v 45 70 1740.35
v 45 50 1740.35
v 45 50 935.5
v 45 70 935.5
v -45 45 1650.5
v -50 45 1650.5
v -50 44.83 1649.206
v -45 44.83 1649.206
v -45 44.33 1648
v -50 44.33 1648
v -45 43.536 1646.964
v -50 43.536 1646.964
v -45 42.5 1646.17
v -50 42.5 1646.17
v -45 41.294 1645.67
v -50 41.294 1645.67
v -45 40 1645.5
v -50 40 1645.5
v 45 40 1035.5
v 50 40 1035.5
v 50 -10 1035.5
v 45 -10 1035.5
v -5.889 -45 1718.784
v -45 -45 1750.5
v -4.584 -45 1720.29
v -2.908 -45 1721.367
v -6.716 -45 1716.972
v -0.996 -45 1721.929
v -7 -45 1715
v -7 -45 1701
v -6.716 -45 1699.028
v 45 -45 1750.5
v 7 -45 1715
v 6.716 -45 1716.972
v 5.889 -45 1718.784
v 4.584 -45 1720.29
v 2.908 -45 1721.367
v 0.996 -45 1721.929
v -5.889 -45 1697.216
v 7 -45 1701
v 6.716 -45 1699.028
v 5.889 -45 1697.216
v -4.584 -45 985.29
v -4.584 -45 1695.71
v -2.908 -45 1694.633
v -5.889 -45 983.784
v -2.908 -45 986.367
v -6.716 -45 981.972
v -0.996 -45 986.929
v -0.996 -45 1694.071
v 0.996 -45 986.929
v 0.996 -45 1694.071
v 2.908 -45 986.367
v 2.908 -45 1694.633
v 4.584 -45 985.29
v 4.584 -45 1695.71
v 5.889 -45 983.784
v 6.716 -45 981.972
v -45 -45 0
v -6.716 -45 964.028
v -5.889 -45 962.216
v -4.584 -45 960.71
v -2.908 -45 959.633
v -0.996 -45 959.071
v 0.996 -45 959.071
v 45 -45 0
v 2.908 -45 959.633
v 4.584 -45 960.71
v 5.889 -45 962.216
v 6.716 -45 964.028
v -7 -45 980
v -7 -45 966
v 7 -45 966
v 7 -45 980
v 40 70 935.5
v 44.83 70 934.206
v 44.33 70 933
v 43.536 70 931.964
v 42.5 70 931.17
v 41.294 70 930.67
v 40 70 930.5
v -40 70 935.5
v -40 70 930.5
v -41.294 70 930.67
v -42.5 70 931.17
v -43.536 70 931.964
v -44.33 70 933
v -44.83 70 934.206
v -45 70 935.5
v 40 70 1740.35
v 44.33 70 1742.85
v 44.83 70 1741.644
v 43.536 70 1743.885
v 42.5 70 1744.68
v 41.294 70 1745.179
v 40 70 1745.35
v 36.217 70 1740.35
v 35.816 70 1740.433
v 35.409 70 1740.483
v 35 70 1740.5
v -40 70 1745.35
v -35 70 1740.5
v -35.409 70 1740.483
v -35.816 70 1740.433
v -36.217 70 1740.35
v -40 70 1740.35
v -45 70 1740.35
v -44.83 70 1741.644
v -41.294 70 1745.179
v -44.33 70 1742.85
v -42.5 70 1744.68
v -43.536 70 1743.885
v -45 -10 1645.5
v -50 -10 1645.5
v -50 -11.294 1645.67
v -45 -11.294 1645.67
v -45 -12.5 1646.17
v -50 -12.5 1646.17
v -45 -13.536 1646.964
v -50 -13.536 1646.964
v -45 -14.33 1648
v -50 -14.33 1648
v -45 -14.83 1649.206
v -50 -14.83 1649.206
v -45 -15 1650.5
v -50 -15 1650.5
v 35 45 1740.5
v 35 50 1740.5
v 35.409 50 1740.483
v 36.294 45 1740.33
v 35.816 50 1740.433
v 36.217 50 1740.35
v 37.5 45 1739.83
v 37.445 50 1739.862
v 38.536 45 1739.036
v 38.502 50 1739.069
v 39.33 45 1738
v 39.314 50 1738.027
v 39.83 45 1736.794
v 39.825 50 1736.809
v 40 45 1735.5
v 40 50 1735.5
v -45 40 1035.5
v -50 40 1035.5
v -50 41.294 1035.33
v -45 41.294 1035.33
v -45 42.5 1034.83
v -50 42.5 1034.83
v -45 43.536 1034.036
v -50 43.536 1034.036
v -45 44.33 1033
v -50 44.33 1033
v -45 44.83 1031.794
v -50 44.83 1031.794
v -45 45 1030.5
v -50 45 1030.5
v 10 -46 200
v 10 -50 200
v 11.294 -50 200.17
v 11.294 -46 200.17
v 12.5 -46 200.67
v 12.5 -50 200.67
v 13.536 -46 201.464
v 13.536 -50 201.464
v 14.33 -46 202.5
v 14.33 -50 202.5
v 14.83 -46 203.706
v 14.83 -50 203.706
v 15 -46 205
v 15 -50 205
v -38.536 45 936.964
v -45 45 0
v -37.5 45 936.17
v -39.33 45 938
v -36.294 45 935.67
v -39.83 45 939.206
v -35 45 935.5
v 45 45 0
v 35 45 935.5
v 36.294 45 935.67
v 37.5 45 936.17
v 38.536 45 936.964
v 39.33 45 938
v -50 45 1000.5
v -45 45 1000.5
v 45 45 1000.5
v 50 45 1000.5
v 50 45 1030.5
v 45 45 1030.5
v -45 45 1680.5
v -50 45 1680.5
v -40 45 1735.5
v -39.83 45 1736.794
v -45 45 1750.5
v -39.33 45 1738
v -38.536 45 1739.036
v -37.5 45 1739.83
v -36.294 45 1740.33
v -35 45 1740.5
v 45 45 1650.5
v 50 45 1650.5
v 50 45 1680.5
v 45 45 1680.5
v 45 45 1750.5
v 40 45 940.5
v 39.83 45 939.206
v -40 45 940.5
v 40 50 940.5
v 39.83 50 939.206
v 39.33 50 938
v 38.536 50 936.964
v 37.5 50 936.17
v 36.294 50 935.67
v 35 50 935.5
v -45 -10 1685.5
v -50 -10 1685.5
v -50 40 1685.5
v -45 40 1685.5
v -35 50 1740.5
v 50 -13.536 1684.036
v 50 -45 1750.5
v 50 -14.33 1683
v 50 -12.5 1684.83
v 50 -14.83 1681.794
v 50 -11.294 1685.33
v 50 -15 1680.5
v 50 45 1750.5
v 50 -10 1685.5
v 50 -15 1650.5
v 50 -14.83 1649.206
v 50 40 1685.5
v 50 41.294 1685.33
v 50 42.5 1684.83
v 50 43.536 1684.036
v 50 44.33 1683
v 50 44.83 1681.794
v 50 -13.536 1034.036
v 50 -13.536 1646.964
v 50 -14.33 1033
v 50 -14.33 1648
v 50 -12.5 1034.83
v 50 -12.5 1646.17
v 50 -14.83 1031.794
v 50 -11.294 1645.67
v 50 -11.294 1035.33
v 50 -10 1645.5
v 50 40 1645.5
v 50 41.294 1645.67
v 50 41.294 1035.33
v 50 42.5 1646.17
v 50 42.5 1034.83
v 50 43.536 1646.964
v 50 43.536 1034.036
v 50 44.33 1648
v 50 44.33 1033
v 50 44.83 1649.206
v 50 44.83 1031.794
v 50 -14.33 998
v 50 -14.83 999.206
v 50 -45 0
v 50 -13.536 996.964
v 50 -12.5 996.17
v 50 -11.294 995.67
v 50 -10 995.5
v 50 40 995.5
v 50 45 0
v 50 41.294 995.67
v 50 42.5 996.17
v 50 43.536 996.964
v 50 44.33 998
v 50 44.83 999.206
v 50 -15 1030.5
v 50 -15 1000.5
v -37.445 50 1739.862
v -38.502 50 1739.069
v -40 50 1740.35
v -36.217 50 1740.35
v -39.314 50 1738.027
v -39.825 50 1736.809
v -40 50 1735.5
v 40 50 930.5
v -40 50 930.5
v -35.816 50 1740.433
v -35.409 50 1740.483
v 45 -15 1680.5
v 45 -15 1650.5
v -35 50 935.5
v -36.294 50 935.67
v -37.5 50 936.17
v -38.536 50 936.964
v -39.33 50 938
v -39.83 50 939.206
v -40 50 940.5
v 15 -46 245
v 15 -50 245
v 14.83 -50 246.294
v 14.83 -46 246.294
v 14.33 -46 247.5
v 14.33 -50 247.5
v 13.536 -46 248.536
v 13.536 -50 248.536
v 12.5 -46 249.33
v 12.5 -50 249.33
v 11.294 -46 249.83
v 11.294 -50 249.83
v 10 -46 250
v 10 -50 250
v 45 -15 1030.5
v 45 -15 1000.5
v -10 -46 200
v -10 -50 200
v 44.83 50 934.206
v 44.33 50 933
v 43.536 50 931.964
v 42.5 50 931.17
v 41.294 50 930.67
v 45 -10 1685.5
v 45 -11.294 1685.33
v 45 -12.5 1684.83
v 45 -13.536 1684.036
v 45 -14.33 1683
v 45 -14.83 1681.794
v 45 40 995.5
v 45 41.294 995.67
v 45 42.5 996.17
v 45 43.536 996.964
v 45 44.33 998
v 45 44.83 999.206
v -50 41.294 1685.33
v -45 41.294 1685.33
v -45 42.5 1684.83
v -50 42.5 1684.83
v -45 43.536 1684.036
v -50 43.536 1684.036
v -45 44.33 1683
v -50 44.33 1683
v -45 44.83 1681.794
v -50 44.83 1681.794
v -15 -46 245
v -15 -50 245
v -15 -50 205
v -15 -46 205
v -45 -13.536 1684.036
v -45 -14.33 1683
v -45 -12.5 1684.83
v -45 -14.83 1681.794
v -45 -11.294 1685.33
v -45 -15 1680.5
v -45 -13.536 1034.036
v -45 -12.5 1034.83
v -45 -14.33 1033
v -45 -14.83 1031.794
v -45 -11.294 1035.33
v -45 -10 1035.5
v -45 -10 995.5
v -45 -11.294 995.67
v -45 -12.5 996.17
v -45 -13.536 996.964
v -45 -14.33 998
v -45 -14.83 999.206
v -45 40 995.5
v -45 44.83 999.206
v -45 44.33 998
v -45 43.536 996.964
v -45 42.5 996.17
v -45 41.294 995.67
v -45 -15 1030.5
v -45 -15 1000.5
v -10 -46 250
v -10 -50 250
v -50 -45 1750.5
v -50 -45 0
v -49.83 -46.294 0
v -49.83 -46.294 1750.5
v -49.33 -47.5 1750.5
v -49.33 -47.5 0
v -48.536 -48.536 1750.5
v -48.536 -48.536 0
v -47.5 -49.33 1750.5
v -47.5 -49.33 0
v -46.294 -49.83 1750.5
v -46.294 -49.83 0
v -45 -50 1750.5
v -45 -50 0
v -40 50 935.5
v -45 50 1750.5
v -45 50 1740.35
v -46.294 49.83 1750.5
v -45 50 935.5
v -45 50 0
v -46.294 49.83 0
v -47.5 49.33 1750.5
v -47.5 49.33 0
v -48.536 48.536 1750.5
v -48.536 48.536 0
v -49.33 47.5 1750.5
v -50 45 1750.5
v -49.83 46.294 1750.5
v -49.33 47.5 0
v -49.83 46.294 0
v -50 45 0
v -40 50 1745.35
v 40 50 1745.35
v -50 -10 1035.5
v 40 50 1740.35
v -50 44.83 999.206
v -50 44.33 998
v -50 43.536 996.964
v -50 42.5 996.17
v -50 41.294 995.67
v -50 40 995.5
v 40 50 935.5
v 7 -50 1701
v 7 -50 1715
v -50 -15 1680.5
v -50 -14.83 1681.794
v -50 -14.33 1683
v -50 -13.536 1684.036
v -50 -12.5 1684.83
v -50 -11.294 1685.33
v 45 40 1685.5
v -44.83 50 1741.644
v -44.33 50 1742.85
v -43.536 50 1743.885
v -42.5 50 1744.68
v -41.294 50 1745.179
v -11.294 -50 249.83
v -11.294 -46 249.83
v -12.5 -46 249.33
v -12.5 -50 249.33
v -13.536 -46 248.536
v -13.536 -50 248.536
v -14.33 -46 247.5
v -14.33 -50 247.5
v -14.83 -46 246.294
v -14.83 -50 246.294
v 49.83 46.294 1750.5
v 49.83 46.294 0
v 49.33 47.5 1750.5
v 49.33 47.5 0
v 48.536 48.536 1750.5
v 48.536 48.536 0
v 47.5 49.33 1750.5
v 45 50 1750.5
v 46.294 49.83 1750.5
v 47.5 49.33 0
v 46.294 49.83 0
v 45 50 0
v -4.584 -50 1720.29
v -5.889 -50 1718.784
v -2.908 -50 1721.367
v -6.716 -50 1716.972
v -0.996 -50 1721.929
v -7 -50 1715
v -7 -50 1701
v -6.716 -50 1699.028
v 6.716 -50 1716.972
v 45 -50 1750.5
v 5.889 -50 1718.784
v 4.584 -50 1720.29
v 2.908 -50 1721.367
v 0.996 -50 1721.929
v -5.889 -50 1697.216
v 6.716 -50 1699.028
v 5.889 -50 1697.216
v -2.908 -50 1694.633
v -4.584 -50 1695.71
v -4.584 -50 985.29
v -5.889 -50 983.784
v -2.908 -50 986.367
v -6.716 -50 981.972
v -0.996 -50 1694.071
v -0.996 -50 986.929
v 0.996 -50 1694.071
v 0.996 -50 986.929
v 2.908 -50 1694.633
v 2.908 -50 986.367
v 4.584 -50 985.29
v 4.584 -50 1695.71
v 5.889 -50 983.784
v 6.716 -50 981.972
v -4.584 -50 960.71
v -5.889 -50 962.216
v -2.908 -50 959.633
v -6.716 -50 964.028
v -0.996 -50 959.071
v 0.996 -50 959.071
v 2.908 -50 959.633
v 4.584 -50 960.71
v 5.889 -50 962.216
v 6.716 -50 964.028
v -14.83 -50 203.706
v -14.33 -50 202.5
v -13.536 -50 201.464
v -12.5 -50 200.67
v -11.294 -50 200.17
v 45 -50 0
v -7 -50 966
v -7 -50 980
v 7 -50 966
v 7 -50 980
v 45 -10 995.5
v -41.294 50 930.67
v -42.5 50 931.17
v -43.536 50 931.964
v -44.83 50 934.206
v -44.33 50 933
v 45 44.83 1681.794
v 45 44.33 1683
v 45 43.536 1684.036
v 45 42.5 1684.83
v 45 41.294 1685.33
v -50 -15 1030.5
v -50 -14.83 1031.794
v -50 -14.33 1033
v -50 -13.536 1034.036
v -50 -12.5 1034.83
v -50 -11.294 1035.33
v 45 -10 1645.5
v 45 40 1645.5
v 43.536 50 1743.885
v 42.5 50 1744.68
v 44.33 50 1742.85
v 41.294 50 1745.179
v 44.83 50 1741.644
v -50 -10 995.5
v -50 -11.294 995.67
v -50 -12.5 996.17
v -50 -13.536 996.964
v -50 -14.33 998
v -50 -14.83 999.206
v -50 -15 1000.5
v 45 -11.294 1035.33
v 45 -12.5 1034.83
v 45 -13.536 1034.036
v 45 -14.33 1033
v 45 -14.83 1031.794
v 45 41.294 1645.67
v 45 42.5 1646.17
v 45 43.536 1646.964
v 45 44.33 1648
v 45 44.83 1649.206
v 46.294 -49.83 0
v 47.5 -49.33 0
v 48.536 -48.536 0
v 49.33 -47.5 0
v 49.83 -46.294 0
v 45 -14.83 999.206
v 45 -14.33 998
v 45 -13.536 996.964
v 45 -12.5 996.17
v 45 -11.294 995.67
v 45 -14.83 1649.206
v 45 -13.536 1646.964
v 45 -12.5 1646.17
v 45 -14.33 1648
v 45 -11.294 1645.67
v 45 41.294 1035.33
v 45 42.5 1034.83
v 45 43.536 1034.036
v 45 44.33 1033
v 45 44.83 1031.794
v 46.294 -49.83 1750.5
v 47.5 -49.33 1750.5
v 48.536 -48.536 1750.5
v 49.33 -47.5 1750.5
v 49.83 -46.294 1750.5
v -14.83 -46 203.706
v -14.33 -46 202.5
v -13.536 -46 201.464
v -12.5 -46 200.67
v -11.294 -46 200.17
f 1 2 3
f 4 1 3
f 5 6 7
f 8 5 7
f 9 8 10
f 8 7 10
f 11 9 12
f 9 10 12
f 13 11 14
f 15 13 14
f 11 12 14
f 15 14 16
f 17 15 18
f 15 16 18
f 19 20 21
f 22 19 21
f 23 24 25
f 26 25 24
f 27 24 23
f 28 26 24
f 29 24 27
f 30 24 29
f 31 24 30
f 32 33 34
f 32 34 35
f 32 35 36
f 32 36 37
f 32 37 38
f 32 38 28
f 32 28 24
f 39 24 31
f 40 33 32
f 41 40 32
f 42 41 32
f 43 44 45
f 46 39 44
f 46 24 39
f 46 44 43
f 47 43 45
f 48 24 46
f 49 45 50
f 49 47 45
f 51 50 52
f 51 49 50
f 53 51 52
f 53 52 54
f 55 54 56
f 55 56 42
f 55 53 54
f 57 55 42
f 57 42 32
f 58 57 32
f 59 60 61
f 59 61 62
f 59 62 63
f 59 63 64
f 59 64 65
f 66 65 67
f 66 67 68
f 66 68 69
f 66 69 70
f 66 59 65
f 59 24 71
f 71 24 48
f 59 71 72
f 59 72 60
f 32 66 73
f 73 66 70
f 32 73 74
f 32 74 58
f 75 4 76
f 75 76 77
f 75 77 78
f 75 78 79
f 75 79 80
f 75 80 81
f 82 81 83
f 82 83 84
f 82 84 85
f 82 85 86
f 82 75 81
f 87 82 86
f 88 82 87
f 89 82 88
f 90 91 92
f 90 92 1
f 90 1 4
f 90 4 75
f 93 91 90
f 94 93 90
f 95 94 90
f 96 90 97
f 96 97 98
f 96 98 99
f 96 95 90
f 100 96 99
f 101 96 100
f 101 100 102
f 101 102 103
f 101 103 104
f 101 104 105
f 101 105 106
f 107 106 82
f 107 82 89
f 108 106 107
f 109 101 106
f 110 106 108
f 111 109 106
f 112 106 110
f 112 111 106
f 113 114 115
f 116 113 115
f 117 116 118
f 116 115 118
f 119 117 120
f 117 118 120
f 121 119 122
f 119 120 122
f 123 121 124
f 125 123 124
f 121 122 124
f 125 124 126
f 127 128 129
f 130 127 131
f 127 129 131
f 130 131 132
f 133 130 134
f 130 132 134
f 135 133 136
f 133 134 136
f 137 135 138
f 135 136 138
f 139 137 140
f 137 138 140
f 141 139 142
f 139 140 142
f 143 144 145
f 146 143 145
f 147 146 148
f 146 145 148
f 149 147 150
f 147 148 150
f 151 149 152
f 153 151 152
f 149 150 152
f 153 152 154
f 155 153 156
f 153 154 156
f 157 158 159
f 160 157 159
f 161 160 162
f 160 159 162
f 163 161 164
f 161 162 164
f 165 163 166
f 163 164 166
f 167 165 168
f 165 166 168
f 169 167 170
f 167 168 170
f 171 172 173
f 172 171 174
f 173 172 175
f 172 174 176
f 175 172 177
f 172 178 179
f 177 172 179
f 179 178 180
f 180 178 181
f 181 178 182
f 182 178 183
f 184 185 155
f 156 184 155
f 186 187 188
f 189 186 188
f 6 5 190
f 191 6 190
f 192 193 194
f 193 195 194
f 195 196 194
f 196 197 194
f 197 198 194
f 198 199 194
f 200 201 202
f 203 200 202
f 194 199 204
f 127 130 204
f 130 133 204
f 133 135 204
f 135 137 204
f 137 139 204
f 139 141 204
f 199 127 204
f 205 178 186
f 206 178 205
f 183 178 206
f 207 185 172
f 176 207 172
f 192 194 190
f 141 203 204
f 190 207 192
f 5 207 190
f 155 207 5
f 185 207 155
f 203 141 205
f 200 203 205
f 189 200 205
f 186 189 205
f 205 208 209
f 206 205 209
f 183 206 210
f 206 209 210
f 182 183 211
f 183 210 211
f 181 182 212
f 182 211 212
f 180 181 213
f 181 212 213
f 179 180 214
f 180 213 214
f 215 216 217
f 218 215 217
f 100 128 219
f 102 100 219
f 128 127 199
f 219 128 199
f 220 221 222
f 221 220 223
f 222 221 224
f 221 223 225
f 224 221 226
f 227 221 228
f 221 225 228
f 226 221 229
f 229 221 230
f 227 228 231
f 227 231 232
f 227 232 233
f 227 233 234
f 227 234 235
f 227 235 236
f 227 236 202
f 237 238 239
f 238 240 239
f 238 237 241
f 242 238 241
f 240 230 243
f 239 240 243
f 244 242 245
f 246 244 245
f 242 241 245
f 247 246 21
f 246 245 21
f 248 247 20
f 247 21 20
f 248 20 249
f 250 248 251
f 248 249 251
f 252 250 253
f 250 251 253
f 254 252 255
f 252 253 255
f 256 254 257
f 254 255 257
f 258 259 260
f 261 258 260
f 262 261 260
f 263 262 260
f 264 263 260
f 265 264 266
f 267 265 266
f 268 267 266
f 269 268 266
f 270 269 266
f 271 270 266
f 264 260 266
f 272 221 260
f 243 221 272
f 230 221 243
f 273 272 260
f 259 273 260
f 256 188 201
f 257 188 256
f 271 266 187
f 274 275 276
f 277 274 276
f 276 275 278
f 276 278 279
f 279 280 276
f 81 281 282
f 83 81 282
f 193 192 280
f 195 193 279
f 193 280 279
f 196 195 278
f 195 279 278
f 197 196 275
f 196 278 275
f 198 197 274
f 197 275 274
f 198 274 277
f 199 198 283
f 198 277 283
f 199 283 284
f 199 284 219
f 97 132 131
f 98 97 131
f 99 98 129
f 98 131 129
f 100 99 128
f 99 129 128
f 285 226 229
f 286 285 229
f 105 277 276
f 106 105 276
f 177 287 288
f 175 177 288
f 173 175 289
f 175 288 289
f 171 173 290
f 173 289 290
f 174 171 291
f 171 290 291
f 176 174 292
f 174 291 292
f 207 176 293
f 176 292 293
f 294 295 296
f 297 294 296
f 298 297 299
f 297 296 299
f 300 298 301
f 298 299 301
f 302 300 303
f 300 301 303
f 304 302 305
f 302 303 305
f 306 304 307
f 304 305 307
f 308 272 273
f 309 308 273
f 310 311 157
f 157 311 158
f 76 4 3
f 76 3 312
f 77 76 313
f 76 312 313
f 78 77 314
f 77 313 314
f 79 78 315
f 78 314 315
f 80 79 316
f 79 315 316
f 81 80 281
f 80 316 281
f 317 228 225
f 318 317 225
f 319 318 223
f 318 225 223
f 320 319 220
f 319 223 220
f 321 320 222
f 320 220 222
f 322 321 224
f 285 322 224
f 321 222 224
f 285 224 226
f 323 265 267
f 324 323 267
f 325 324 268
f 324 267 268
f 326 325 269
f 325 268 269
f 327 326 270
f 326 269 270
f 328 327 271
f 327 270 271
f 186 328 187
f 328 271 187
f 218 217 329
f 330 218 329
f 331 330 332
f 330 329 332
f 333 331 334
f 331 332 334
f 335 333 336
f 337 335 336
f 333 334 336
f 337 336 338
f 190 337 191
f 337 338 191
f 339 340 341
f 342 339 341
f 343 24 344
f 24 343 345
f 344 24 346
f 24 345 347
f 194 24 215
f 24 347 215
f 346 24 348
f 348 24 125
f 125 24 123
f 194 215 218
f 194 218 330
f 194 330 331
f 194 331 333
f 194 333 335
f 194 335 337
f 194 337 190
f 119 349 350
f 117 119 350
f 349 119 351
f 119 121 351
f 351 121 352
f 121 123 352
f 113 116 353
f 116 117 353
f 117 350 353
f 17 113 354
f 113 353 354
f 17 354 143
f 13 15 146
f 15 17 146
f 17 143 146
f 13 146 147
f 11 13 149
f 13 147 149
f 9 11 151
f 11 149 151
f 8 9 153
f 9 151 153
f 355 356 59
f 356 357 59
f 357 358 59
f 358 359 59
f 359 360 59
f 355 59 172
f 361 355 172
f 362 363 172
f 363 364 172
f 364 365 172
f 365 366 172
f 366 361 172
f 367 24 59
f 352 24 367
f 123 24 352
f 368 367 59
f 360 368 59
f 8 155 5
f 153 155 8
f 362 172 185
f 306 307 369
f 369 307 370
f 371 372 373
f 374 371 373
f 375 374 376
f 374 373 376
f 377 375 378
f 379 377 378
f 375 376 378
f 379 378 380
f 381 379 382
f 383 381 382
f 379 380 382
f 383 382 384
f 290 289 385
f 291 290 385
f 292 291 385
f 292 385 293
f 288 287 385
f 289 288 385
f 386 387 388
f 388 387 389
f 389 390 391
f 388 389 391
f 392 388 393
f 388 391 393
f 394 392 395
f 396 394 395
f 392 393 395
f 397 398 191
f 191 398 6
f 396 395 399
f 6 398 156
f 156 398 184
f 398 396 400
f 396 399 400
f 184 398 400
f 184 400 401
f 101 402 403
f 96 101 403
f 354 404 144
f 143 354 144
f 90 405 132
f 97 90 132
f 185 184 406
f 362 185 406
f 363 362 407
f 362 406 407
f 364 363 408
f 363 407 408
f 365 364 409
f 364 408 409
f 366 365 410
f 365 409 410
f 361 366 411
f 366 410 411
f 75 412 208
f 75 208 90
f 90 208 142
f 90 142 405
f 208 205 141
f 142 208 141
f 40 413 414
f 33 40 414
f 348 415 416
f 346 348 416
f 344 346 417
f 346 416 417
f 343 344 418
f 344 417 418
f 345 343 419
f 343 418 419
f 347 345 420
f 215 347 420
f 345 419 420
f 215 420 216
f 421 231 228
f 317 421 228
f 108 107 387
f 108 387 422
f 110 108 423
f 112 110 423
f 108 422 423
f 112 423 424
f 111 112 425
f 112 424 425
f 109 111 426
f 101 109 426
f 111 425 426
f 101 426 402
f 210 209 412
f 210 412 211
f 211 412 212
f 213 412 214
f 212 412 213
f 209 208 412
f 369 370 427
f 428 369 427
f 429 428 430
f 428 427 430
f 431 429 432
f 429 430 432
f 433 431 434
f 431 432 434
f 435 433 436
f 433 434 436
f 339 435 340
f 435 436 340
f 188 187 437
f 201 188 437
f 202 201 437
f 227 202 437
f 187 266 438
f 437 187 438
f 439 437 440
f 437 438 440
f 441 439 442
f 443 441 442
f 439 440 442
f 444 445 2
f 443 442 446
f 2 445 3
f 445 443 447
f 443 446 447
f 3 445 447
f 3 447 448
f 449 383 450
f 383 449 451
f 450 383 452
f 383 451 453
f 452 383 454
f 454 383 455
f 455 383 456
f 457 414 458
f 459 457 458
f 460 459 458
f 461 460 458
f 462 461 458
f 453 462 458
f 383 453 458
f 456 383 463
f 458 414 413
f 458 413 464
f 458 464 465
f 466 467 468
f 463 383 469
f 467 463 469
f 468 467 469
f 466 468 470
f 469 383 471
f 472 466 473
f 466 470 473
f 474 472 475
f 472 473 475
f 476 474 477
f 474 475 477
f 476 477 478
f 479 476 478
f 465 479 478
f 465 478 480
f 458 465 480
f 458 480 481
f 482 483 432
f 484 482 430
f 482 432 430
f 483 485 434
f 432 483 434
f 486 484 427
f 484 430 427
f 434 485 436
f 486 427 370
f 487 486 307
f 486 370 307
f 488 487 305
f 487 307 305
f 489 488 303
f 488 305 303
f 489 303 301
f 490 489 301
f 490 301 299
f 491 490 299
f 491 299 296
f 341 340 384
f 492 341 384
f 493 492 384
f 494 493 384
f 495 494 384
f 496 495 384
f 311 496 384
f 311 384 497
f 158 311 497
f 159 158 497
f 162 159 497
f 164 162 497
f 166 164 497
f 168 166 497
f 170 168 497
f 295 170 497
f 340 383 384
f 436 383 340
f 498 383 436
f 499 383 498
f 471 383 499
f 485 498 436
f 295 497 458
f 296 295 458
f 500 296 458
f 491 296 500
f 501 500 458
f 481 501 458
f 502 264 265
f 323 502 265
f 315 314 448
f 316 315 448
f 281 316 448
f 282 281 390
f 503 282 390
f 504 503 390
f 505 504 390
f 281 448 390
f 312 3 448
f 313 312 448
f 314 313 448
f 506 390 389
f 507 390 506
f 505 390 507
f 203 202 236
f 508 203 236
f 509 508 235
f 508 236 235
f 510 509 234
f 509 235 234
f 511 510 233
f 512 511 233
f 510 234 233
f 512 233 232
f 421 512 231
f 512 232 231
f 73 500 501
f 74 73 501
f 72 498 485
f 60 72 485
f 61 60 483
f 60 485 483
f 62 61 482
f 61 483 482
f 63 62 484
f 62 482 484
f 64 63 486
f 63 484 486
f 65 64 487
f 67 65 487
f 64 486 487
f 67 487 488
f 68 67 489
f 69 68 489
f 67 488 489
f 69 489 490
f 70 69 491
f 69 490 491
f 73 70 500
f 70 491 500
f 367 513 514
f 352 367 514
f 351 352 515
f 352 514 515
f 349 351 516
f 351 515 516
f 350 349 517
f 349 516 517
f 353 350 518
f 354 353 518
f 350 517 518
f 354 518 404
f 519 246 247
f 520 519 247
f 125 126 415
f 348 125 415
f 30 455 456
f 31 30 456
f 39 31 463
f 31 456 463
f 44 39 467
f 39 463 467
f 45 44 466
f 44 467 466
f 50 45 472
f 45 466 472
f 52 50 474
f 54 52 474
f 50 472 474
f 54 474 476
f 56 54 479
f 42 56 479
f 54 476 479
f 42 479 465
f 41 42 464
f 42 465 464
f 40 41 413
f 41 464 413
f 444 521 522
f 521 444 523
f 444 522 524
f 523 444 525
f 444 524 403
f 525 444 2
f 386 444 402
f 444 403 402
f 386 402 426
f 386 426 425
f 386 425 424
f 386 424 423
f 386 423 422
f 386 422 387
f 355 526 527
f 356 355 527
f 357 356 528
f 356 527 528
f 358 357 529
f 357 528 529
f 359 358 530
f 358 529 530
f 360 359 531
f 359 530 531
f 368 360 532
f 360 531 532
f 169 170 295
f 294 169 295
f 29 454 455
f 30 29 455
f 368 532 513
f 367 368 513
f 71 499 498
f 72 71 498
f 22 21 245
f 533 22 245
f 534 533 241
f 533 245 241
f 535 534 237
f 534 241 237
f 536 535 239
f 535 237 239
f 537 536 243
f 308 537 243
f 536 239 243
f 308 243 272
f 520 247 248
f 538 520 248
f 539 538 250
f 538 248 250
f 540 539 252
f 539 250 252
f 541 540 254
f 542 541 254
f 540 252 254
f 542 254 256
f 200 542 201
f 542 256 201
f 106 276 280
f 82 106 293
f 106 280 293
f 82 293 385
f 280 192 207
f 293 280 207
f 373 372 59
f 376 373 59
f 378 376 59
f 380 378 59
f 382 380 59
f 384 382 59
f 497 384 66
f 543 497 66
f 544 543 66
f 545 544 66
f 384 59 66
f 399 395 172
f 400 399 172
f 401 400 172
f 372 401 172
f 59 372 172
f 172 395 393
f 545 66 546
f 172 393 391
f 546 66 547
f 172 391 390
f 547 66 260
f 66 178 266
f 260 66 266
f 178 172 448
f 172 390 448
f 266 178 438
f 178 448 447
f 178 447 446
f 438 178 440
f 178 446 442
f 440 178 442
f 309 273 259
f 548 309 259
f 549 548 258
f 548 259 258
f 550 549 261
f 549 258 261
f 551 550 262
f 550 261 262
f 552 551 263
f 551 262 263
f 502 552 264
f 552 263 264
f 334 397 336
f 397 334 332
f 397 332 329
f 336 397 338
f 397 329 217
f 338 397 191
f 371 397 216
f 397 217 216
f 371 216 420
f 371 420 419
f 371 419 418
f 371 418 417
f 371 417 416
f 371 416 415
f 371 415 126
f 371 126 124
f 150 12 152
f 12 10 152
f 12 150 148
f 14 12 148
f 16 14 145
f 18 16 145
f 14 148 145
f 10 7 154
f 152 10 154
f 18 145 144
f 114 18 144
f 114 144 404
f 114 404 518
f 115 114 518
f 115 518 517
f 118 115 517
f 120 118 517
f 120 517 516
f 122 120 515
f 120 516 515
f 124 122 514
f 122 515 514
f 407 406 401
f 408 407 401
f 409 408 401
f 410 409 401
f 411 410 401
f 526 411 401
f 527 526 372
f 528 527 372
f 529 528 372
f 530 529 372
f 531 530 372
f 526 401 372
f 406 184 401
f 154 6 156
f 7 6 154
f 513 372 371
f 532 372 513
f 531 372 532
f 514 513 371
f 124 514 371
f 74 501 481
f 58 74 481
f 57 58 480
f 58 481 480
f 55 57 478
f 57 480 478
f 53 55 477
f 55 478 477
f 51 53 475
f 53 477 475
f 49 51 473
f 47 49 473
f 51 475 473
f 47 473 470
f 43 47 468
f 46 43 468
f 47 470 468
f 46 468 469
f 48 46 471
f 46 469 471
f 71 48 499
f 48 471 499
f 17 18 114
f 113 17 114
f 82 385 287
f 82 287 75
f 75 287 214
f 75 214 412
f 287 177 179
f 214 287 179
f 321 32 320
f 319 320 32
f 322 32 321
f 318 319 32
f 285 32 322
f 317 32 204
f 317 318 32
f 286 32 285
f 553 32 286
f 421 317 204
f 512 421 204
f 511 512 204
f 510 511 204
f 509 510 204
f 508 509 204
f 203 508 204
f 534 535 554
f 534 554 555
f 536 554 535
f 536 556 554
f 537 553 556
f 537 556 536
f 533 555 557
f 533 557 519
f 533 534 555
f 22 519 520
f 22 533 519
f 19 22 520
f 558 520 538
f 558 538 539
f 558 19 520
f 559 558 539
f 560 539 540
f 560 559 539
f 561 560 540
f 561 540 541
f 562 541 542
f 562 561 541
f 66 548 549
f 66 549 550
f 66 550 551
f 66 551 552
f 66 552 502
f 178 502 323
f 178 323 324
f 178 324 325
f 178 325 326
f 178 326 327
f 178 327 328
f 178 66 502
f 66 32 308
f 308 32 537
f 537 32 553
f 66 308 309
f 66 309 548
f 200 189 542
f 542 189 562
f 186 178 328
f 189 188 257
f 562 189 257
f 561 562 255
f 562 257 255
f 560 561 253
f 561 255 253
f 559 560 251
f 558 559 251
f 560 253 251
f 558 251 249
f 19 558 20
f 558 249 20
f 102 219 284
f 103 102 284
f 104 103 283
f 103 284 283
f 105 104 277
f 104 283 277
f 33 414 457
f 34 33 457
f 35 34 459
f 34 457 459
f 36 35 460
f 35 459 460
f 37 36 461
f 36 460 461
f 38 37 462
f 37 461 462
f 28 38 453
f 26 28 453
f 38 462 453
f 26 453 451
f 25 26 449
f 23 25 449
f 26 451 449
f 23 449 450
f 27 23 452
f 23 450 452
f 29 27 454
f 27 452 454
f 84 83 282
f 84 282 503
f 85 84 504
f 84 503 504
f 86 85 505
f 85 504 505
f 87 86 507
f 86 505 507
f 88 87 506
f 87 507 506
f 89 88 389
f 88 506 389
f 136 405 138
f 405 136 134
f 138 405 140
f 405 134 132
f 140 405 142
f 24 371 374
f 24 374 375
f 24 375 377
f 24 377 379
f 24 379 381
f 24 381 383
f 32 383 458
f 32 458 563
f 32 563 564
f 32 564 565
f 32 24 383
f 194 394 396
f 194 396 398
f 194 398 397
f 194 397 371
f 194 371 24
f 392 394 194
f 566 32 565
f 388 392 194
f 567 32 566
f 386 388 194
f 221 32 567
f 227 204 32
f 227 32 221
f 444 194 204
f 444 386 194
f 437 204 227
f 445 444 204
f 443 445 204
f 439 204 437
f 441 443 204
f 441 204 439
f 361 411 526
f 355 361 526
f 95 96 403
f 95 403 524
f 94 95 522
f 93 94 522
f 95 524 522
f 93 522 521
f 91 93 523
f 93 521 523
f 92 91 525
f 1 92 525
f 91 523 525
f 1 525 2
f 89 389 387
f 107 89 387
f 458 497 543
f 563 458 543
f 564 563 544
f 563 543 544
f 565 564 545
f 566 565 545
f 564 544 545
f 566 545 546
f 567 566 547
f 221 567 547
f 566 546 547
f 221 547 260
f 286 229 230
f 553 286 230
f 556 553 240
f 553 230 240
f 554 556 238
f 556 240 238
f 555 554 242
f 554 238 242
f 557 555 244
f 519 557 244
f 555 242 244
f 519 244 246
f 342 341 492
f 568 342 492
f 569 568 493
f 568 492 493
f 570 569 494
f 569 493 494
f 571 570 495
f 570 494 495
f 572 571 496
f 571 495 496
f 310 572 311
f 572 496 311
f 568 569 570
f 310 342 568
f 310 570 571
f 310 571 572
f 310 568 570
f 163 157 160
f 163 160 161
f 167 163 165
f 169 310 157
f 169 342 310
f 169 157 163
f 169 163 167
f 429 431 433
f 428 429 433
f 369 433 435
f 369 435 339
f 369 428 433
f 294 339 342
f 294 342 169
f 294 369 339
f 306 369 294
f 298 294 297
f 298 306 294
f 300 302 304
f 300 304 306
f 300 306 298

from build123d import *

# Parameters (mm, degrees)
F0_W      = 90
F0_H      = 90
F1_DEPTH  = 1750.5
F3_DEPTH  = 4
F5_DEPTH  = 25
F7_DEPTH  = 25
F9_DEPTH  = 25
F11_DEPTH = 25
F13_DEPTH = 20


with BuildPart() as f1:
    # F0 (on Top) → F1 (new body)
    with BuildSketch(Plane.XY):
        with BuildLine():
            ThreePointArc((50, 45), (48.5355339059, 48.5355339059), (45, 50))
            Line((45, 50), (-45, 50))
            ThreePointArc((-45, 50), (-48.5355339059, 48.5355339059), (-50, 45))
            Line((-50, 45), (-50, -45))
            ThreePointArc((-50, -45), (-48.5355339059, -48.5355339059), (-45, -50))
            Line((-45, -50), (45, -50))
            ThreePointArc((45, -50), (48.5355339059, -48.5355339059), (50, -45))
            Line((50, -45), (50, 45))
        make_face()
        Rectangle(F0_W, F0_H, mode=Mode.SUBTRACT)
    extrude(amount=F1_DEPTH)

    # F2 (on face) → F3 (cut)
    with BuildSketch(Plane.XZ.offset(50)):
        with BuildLine():
            ThreePointArc((-15, 205), (-13.5355339059, 201.4644660941), (-10, 200))
            Line((-10, 200), (10, 200))
            ThreePointArc((10, 200), (13.5355339059, 201.4644660941), (15, 205))
            Line((15, 205), (15, 245))
            ThreePointArc((15, 245), (13.5355339059, 248.5355339059), (10, 250))
            Line((10, 250), (-10, 250))
            ThreePointArc((-10, 250), (-13.5355339059, 248.5355339059), (-15, 245))
            Line((-15, 245), (-15, 205))
        make_face()
    extrude(amount=-F3_DEPTH, mode=Mode.SUBTRACT)

    # F4 (on face) → F5 (cut)
    with BuildSketch(Plane(origin=(0, 50, 0), x_dir=(-1, 0, 0), z_dir=(0, 1, 0))):
        with BuildLine():
            Line((35, 1740.5), (-35, 1740.5))
            ThreePointArc((-35, 1740.5), (-38.5355339059, 1739.0355339059), (-40, 1735.5))
            Line((-40, 1735.5), (-40, 940.5))
            ThreePointArc((-40, 940.5), (-38.5355339059, 936.9644660941), (-35, 935.5))
            Line((-35, 935.5), (35, 935.5))
            ThreePointArc((35, 935.5), (38.5355339059, 936.9644660941), (40, 940.5))
            Line((40, 940.5), (40, 1735.5))
            ThreePointArc((40, 1735.5), (38.5355339059, 1739.0355339059), (35, 1740.5))
        make_face()
    extrude(amount=-F5_DEPTH, mode=Mode.SUBTRACT)

    # F6 (on face) → F7 (cut)
    with BuildSketch(Plane.XZ.offset(50)):
        with BuildLine():
            Line((7, 966), (7, 980))
            ThreePointArc((7, 980), (0, 987), (-7, 980))
            Line((-7, 980), (-7, 966))
            ThreePointArc((-7, 966), (0, 959), (7, 966))
        make_face()
        with BuildLine():
            Line((-7, 1715), (-7, 1701))
            ThreePointArc((-7, 1701), (0, 1694), (7, 1701))
            Line((7, 1701), (7, 1715))
            ThreePointArc((7, 1715), (0, 1722), (-7, 1715))
        make_face()
    extrude(amount=-F7_DEPTH, mode=Mode.SUBTRACT)

    # F8 (on face) → F9 (cut)
    with BuildSketch(Plane.YZ.offset(50)):
        with BuildLine():
            Line((45, 1000.5), (45, 1030.5))
            ThreePointArc((45, 1030.5), (43.5355339059, 1034.0355339059), (40, 1035.5))
            Line((40, 1035.5), (-10, 1035.5))
            ThreePointArc((-10, 1035.5), (-13.5355339059, 1034.0355339059), (-15, 1030.5))
            Line((-15, 1030.5), (-15, 1000.5))
            ThreePointArc((-15, 1000.5), (-13.5355339059, 996.9644660941), (-10, 995.5))
            Line((-10, 995.5), (40, 995.5))
            ThreePointArc((40, 995.5), (43.5355339059, 996.9644660941), (45, 1000.5))
        make_face()
        with BuildLine():
            Line((40, 1685.5), (-10, 1685.5))
            ThreePointArc((-10, 1685.5), (-13.5355339059, 1684.0355339059), (-15, 1680.5))
            Line((-15, 1680.5), (-15, 1650.5))
            ThreePointArc((-15, 1650.5), (-13.5355339059, 1646.9644660941), (-10, 1645.5))
            Line((-10, 1645.5), (40, 1645.5))
            ThreePointArc((40, 1645.5), (43.5355339059, 1646.9644660941), (45, 1650.5))
            Line((45, 1650.5), (45, 1680.5))
            ThreePointArc((45, 1680.5), (43.5355339059, 1684.0355339059), (40, 1685.5))
        make_face()
    extrude(amount=-F9_DEPTH, mode=Mode.SUBTRACT)

    # F10 (on face) → F11 (cut)
    with BuildSketch(Plane(origin=(-50, 0, 0), x_dir=(0, -1, 0), z_dir=(-1, 0, 0))):
        with BuildLine():
            Line((10, 1685.5), (-40, 1685.5))
            ThreePointArc((-40, 1685.5), (-43.5355339059, 1684.0355339059), (-45, 1680.5))
            Line((-45, 1680.5), (-45, 1650.5))
            ThreePointArc((-45, 1650.5), (-43.5355339059, 1646.9644660941), (-40, 1645.5))
            Line((-40, 1645.5), (10, 1645.5))
            ThreePointArc((10, 1645.5), (13.5355339059, 1646.9644660941), (15, 1650.5))
            Line((15, 1650.5), (15, 1680.5))
            ThreePointArc((15, 1680.5), (13.5355339059, 1684.0355339059), (10, 1685.5))
        make_face()
        with BuildLine():
            ThreePointArc((-40, 1035.5), (-43.5355339059, 1034.0355339059), (-45, 1030.5))
            Line((-45, 1030.5), (-45, 1000.5))
            ThreePointArc((-45, 1000.5), (-43.5355339059, 996.9644660941), (-40, 995.5))
            Line((-40, 995.5), (10, 995.5))
            ThreePointArc((10, 995.5), (13.5355339059, 996.9644660941), (15, 1000.5))
            Line((15, 1000.5), (15, 1030.5))
            ThreePointArc((15, 1030.5), (13.5355339059, 1034.0355339059), (10, 1035.5))
            Line((10, 1035.5), (-40, 1035.5))
        make_face()
    extrude(amount=-F11_DEPTH, mode=Mode.SUBTRACT)

    # F12 (on face) → F13 (join)
    with BuildSketch(Plane(origin=(0, 50, 0), x_dir=(-1, 0, 0), z_dir=(0, 1, 0))):
        with BuildLine():
            ThreePointArc((-45, 935.5), (-43.5355339059, 931.9644660941), (-40, 930.5))
            Line((-40, 930.5), (40, 930.5))
            ThreePointArc((40, 930.5), (43.5355339059, 931.9644660941), (45, 935.5))
            Line((45, 935.5), (45, 1740.3495705284))
            ThreePointArc((45, 1740.3495705284), (43.5355339059, 1743.8851044344), (40, 1745.3495705284))
            Line((40, 1745.3495705284), (-40, 1745.3495705284))
            ThreePointArc((-40, 1745.3495705284), (-43.5355339059, 1743.8851044344), (-45, 1740.3495705284))
            Line((-45, 1740.3495705284), (-45, 935.5))
        make_face()
        with BuildLine():
            Line((-40, 1735.5), (-40, 1740.3495705284))
            Line((-40, 1740.3495705284), (-36.2172369078, 1740.3495705284))
            ThreePointArc((-36.2172369078, 1740.3495705284), (-35.6132484642, 1740.4622501268), (-35, 1740.5))
            Line((-35, 1740.5), (35, 1740.5))
            ThreePointArc((35, 1740.5), (35.6132484642, 1740.4622501268), (36.2172369078, 1740.3495705284))
            Line((36.2172369078, 1740.3495705284), (40, 1740.3495705284))
            Line((40, 1740.3495705284), (40, 1735.5))
            Line((40, 1735.5), (40, 940.5))
            Line((40, 940.5), (40, 935.5))
            Line((40, 935.5), (35, 935.5))
            Line((35, 935.5), (-35, 935.5))
            Line((-35, 935.5), (-40, 935.5))
            Line((-40, 935.5), (-40, 940.5))
            Line((-40, 940.5), (-40, 1735.5))
        make_face(mode=Mode.SUBTRACT)
    extrude(amount=F13_DEPTH)


solid = f1.part
